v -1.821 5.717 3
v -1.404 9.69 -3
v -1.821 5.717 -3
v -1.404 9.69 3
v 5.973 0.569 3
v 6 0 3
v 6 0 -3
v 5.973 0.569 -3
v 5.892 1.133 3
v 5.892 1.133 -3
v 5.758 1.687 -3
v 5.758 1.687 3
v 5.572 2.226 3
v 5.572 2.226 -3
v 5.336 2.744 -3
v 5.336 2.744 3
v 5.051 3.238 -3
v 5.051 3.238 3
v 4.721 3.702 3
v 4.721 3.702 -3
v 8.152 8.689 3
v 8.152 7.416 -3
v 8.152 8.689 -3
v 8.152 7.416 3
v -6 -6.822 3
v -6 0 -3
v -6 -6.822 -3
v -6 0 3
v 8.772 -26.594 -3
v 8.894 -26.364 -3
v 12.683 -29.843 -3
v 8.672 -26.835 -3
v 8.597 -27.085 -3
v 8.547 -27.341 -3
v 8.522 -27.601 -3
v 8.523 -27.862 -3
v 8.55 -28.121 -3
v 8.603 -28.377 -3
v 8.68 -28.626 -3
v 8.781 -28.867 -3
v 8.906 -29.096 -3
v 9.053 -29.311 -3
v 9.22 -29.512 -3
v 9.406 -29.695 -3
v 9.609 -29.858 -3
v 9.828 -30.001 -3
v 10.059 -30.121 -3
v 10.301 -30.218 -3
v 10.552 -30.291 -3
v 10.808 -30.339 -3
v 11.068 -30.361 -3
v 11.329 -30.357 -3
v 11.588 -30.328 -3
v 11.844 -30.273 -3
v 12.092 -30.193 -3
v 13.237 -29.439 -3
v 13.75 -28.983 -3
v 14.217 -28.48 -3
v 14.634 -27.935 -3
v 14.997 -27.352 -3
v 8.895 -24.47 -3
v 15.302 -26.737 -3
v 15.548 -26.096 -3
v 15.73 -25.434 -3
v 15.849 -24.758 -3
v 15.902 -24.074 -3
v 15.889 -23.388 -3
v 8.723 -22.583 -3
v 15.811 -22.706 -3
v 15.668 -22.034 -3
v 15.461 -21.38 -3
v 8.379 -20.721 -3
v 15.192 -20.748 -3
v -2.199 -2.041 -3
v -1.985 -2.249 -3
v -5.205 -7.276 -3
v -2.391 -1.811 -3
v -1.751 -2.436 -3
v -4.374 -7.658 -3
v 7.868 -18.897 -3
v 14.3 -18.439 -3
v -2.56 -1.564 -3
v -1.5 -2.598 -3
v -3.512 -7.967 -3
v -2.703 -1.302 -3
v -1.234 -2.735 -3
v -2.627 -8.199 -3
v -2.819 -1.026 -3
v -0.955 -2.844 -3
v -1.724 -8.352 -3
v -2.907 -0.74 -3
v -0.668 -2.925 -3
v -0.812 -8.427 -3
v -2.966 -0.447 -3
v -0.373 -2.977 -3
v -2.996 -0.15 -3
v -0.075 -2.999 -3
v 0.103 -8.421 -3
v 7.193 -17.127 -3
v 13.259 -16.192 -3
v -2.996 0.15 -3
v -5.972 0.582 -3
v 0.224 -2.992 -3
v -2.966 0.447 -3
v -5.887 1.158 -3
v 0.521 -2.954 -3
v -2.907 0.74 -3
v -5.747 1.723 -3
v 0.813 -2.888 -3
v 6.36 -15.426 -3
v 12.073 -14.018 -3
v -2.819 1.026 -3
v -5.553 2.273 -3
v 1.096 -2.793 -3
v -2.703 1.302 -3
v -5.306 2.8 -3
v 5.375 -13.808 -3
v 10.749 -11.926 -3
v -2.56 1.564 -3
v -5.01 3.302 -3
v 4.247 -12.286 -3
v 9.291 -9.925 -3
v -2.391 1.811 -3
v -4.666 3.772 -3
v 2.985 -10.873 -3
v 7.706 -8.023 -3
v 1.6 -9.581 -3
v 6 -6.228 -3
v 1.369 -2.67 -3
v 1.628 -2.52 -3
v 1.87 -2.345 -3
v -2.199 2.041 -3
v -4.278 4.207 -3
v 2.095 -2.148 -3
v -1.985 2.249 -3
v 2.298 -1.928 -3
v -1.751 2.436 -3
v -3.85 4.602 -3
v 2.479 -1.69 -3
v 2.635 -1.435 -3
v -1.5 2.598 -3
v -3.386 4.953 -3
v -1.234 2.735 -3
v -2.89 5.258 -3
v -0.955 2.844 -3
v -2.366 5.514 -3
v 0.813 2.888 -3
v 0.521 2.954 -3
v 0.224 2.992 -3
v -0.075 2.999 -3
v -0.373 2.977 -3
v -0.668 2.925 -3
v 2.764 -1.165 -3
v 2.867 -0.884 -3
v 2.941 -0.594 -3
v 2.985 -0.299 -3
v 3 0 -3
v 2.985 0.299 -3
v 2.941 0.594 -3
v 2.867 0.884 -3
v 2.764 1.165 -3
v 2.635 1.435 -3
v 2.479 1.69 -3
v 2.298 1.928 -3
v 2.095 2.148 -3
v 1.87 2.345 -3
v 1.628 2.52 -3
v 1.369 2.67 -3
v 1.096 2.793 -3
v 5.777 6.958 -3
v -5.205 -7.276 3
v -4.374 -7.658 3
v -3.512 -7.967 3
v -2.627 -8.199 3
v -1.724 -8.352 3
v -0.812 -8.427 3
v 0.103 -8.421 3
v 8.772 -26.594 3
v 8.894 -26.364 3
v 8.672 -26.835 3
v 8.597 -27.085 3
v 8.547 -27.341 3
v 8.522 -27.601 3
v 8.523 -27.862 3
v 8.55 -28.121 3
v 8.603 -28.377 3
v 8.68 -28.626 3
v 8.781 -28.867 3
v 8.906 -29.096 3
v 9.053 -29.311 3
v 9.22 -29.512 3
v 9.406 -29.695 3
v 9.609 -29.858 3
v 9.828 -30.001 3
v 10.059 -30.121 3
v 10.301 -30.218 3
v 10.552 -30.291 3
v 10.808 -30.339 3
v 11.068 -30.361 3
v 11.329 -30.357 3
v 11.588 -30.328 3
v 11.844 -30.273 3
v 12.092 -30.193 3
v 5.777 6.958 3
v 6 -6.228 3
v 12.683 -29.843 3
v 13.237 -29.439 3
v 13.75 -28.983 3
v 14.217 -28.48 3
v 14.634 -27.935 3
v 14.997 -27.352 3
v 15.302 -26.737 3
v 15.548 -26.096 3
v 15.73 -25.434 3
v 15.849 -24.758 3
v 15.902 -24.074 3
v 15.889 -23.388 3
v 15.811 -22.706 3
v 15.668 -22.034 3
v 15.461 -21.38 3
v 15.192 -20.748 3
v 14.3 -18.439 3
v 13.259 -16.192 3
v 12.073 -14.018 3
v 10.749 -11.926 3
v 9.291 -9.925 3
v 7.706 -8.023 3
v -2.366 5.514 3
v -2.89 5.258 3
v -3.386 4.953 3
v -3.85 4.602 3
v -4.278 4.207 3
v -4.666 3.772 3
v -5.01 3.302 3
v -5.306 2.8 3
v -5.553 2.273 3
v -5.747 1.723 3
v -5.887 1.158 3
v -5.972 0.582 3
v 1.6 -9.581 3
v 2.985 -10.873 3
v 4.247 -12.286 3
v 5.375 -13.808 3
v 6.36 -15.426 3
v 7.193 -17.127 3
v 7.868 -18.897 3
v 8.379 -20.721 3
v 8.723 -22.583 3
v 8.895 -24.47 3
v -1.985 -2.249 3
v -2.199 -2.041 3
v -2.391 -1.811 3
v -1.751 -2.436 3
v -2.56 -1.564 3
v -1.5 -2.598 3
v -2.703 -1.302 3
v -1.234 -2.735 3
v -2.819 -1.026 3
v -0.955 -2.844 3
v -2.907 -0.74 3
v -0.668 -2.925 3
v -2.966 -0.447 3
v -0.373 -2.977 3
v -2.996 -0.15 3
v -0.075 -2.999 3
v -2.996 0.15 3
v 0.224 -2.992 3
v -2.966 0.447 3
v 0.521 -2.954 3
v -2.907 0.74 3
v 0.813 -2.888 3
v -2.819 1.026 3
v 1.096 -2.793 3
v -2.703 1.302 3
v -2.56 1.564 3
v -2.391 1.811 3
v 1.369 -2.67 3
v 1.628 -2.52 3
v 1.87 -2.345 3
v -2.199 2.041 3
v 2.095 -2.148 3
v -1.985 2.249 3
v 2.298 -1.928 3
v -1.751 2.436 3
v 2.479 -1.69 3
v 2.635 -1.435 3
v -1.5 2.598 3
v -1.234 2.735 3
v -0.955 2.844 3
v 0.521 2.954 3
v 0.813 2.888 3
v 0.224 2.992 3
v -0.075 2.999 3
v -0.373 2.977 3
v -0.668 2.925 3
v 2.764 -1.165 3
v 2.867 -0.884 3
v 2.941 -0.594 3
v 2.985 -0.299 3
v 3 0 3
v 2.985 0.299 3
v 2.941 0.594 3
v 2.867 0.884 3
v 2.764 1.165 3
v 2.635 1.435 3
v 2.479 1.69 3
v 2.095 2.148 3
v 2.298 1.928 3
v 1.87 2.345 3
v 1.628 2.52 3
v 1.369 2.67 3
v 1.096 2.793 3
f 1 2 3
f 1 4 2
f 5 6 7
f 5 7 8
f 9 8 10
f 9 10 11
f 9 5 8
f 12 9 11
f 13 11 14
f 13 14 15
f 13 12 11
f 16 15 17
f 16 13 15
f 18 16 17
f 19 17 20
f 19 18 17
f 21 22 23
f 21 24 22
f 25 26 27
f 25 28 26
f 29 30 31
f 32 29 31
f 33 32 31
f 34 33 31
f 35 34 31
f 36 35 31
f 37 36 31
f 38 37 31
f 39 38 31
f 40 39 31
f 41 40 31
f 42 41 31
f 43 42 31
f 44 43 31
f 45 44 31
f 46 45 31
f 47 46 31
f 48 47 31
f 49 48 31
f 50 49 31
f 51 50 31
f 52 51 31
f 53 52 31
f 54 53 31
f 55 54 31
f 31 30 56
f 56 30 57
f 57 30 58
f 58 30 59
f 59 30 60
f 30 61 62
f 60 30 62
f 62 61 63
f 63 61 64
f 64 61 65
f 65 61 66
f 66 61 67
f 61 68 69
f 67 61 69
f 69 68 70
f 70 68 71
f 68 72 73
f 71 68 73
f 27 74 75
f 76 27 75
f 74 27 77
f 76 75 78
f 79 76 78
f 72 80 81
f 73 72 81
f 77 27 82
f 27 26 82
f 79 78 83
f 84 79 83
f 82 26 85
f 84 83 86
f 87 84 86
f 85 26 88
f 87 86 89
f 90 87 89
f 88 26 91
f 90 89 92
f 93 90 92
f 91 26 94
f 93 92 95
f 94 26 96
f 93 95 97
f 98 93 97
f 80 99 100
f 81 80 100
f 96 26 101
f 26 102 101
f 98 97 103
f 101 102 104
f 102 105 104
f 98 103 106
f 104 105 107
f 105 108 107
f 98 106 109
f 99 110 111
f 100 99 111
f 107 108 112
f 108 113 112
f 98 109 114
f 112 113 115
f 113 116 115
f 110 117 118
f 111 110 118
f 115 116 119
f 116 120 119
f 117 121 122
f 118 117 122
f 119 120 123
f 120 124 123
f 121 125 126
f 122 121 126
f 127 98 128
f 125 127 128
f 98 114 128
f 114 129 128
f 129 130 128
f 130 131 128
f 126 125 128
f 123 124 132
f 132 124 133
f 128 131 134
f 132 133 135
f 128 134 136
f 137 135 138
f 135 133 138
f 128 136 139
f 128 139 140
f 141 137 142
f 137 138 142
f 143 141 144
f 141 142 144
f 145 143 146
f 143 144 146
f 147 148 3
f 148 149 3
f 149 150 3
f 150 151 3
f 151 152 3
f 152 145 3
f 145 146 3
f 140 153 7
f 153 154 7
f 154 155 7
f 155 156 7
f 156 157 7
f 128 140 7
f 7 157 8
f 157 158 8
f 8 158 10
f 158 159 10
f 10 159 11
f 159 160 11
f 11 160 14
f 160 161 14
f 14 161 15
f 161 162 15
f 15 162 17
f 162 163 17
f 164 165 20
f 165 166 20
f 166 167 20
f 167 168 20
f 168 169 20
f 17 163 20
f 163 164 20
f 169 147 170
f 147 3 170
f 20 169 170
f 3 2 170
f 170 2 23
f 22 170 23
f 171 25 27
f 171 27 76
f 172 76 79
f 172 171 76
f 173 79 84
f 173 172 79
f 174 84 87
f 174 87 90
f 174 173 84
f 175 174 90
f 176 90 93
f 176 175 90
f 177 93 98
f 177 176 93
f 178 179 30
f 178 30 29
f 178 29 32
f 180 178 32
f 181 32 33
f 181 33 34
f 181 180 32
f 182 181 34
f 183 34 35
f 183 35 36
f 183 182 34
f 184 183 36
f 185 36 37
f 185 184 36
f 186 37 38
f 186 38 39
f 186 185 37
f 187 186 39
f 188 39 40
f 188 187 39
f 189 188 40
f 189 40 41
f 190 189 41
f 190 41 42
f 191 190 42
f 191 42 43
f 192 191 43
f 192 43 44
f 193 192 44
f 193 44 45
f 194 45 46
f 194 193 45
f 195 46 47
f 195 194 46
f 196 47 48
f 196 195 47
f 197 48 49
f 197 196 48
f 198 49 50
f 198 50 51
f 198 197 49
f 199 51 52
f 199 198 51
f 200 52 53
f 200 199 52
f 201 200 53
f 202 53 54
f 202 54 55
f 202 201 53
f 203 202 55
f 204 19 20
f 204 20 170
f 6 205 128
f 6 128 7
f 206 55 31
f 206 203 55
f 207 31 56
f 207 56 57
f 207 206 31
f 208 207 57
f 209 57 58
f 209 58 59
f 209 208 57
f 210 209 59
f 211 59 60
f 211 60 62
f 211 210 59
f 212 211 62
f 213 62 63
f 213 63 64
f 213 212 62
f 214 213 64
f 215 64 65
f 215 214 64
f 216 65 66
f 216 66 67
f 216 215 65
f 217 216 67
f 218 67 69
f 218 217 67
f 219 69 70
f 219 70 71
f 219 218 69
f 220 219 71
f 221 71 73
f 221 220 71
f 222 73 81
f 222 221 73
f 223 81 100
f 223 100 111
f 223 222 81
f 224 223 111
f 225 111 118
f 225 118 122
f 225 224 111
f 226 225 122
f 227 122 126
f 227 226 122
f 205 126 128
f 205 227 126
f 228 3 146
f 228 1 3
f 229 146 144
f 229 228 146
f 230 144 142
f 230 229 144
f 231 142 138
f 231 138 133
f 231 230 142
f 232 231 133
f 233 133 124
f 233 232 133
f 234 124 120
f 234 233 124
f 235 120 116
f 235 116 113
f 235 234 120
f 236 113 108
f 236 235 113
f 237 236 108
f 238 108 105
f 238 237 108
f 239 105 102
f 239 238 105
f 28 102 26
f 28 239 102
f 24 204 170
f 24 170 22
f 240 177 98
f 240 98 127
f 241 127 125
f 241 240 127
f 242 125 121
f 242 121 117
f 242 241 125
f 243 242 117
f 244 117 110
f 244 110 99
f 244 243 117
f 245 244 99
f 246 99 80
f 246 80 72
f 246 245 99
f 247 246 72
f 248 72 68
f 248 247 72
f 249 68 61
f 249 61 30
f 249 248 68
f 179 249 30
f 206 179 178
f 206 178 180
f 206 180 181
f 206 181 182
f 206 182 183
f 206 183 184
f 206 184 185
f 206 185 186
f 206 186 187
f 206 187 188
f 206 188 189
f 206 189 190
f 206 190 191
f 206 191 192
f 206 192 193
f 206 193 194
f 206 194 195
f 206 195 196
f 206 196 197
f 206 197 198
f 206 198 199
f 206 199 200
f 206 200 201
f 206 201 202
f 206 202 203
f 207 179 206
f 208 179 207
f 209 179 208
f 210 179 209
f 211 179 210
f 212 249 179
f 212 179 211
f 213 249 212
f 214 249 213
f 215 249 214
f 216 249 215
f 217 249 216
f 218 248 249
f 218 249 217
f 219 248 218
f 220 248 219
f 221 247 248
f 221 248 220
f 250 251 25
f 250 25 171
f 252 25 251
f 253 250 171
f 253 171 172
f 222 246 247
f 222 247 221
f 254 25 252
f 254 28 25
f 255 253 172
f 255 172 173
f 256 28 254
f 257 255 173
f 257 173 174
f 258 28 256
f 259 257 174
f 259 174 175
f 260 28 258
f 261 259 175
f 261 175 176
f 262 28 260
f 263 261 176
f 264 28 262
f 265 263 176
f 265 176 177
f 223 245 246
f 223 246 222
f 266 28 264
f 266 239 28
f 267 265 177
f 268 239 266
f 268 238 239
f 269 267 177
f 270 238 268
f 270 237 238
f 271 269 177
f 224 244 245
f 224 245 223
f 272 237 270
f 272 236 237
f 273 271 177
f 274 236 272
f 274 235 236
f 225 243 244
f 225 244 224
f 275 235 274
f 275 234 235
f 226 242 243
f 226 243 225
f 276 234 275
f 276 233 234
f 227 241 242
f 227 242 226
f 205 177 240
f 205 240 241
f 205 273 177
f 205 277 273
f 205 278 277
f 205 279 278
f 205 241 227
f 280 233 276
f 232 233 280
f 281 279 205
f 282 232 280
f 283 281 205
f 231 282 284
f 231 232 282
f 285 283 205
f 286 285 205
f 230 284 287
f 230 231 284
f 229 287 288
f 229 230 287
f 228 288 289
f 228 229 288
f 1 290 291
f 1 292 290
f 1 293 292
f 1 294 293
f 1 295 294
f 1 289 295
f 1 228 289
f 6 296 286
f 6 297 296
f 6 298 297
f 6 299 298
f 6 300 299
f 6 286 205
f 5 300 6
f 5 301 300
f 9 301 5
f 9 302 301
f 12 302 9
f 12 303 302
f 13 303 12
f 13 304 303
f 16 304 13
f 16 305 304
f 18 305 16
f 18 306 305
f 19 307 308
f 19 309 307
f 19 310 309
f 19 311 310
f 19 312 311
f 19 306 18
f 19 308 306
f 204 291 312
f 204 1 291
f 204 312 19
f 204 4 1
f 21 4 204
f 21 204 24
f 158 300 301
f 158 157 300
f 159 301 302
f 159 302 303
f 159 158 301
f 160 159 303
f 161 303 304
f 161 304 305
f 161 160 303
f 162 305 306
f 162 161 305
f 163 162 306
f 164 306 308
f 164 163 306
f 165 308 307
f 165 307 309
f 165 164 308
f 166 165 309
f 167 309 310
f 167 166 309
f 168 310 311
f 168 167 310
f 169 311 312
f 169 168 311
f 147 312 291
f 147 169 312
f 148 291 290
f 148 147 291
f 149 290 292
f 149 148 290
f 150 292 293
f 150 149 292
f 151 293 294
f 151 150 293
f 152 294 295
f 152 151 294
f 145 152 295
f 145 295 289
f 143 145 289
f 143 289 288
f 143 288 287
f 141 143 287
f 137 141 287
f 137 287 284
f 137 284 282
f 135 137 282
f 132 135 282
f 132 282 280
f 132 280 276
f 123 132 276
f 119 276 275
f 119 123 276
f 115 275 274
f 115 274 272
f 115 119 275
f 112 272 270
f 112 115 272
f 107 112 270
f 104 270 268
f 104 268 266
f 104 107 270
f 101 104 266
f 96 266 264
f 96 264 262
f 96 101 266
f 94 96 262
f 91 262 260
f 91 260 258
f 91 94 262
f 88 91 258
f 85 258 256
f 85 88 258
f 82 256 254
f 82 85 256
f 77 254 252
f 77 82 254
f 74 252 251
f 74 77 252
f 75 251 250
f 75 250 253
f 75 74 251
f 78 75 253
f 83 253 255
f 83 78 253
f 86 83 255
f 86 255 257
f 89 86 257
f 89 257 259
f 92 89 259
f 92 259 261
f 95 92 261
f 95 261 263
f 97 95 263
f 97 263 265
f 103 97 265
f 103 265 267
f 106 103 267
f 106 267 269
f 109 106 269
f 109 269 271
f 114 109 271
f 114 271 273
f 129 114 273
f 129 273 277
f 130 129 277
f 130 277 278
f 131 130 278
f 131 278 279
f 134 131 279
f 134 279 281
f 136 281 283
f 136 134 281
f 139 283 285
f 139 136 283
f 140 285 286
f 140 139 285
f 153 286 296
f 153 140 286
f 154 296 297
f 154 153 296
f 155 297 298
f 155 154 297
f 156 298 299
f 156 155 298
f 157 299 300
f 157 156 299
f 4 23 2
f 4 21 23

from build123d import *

# Parameters (mm, degrees)
SKETCH_1_R      = 3
EXTRUDE_1_DEPTH = 3
EXTRUDE_2_DEPTH = 3


with BuildPart() as part:
    # 스케치1 → 보스-돌출1 (new, symmetric)
    with BuildSketch(Plane.XY):
        with BuildLine():
            ThreePointArc((-1.820682976, 5.7170896), (-4.843763922, 3.54089693), (-6, 0))
            Line((-6, 0), (-6, -6.821714583))
            ThreePointArc((-6, -6.821714583), (-3.071789079, -8.092559434), (0.10340711, -8.420576201))
            ThreePointArc((0.10340711, -8.420576201), (3.220497082, -7.778565282), (6, -6.22847127))
            Line((6, -6.22847127), (6, 0))
            ThreePointArc((6, 0), (5.671362579, 1.95848066), (4.721451168, 3.702417976))
            Line((4.721451168, 3.702417976), (5.777136763, 6.958366163))
            Line((5.777136763, 6.958366163), (8.152285112, 7.41624395))
            Line((8.152285112, 7.41624395), (8.152285112, 8.689000591))
            Line((8.152285112, 8.689000591), (-1.404354977, 9.690365056))
            Line((-1.404354977, 9.690365056), (-1.820682976, 5.7170896))
        make_face()
        Circle(SKETCH_1_R, mode=Mode.SUBTRACT)
    extrude(amount=EXTRUDE_1_DEPTH, both=True)

    # 스케치1<4> → 보스-돌출2 (add, symmetric)
    with BuildSketch(Plane.XY):
        with BuildLine():
            ThreePointArc((6, -6.22847127), (3.220497082, -7.778565282), (0.10340711, -8.420576201))
            ThreePointArc((0.10340711, -8.420576201), (6.795906325, -16.266900398), (8.894248996, -26.363994395))
            ThreePointArc((8.894248996, -26.363994395), (9.133835845, -29.413676999), (12.091934084, -30.193177258))
            ThreePointArc((12.091934084, -30.193177258), (15.547503566, -26.096056877), (15.192388226, -20.748043324))
            ThreePointArc((15.192388226, -20.748043324), (11.428197085, -12.961513513), (6, -6.22847127))
        make_face()
    extrude(amount=EXTRUDE_2_DEPTH, both=True)


solid = part.part
